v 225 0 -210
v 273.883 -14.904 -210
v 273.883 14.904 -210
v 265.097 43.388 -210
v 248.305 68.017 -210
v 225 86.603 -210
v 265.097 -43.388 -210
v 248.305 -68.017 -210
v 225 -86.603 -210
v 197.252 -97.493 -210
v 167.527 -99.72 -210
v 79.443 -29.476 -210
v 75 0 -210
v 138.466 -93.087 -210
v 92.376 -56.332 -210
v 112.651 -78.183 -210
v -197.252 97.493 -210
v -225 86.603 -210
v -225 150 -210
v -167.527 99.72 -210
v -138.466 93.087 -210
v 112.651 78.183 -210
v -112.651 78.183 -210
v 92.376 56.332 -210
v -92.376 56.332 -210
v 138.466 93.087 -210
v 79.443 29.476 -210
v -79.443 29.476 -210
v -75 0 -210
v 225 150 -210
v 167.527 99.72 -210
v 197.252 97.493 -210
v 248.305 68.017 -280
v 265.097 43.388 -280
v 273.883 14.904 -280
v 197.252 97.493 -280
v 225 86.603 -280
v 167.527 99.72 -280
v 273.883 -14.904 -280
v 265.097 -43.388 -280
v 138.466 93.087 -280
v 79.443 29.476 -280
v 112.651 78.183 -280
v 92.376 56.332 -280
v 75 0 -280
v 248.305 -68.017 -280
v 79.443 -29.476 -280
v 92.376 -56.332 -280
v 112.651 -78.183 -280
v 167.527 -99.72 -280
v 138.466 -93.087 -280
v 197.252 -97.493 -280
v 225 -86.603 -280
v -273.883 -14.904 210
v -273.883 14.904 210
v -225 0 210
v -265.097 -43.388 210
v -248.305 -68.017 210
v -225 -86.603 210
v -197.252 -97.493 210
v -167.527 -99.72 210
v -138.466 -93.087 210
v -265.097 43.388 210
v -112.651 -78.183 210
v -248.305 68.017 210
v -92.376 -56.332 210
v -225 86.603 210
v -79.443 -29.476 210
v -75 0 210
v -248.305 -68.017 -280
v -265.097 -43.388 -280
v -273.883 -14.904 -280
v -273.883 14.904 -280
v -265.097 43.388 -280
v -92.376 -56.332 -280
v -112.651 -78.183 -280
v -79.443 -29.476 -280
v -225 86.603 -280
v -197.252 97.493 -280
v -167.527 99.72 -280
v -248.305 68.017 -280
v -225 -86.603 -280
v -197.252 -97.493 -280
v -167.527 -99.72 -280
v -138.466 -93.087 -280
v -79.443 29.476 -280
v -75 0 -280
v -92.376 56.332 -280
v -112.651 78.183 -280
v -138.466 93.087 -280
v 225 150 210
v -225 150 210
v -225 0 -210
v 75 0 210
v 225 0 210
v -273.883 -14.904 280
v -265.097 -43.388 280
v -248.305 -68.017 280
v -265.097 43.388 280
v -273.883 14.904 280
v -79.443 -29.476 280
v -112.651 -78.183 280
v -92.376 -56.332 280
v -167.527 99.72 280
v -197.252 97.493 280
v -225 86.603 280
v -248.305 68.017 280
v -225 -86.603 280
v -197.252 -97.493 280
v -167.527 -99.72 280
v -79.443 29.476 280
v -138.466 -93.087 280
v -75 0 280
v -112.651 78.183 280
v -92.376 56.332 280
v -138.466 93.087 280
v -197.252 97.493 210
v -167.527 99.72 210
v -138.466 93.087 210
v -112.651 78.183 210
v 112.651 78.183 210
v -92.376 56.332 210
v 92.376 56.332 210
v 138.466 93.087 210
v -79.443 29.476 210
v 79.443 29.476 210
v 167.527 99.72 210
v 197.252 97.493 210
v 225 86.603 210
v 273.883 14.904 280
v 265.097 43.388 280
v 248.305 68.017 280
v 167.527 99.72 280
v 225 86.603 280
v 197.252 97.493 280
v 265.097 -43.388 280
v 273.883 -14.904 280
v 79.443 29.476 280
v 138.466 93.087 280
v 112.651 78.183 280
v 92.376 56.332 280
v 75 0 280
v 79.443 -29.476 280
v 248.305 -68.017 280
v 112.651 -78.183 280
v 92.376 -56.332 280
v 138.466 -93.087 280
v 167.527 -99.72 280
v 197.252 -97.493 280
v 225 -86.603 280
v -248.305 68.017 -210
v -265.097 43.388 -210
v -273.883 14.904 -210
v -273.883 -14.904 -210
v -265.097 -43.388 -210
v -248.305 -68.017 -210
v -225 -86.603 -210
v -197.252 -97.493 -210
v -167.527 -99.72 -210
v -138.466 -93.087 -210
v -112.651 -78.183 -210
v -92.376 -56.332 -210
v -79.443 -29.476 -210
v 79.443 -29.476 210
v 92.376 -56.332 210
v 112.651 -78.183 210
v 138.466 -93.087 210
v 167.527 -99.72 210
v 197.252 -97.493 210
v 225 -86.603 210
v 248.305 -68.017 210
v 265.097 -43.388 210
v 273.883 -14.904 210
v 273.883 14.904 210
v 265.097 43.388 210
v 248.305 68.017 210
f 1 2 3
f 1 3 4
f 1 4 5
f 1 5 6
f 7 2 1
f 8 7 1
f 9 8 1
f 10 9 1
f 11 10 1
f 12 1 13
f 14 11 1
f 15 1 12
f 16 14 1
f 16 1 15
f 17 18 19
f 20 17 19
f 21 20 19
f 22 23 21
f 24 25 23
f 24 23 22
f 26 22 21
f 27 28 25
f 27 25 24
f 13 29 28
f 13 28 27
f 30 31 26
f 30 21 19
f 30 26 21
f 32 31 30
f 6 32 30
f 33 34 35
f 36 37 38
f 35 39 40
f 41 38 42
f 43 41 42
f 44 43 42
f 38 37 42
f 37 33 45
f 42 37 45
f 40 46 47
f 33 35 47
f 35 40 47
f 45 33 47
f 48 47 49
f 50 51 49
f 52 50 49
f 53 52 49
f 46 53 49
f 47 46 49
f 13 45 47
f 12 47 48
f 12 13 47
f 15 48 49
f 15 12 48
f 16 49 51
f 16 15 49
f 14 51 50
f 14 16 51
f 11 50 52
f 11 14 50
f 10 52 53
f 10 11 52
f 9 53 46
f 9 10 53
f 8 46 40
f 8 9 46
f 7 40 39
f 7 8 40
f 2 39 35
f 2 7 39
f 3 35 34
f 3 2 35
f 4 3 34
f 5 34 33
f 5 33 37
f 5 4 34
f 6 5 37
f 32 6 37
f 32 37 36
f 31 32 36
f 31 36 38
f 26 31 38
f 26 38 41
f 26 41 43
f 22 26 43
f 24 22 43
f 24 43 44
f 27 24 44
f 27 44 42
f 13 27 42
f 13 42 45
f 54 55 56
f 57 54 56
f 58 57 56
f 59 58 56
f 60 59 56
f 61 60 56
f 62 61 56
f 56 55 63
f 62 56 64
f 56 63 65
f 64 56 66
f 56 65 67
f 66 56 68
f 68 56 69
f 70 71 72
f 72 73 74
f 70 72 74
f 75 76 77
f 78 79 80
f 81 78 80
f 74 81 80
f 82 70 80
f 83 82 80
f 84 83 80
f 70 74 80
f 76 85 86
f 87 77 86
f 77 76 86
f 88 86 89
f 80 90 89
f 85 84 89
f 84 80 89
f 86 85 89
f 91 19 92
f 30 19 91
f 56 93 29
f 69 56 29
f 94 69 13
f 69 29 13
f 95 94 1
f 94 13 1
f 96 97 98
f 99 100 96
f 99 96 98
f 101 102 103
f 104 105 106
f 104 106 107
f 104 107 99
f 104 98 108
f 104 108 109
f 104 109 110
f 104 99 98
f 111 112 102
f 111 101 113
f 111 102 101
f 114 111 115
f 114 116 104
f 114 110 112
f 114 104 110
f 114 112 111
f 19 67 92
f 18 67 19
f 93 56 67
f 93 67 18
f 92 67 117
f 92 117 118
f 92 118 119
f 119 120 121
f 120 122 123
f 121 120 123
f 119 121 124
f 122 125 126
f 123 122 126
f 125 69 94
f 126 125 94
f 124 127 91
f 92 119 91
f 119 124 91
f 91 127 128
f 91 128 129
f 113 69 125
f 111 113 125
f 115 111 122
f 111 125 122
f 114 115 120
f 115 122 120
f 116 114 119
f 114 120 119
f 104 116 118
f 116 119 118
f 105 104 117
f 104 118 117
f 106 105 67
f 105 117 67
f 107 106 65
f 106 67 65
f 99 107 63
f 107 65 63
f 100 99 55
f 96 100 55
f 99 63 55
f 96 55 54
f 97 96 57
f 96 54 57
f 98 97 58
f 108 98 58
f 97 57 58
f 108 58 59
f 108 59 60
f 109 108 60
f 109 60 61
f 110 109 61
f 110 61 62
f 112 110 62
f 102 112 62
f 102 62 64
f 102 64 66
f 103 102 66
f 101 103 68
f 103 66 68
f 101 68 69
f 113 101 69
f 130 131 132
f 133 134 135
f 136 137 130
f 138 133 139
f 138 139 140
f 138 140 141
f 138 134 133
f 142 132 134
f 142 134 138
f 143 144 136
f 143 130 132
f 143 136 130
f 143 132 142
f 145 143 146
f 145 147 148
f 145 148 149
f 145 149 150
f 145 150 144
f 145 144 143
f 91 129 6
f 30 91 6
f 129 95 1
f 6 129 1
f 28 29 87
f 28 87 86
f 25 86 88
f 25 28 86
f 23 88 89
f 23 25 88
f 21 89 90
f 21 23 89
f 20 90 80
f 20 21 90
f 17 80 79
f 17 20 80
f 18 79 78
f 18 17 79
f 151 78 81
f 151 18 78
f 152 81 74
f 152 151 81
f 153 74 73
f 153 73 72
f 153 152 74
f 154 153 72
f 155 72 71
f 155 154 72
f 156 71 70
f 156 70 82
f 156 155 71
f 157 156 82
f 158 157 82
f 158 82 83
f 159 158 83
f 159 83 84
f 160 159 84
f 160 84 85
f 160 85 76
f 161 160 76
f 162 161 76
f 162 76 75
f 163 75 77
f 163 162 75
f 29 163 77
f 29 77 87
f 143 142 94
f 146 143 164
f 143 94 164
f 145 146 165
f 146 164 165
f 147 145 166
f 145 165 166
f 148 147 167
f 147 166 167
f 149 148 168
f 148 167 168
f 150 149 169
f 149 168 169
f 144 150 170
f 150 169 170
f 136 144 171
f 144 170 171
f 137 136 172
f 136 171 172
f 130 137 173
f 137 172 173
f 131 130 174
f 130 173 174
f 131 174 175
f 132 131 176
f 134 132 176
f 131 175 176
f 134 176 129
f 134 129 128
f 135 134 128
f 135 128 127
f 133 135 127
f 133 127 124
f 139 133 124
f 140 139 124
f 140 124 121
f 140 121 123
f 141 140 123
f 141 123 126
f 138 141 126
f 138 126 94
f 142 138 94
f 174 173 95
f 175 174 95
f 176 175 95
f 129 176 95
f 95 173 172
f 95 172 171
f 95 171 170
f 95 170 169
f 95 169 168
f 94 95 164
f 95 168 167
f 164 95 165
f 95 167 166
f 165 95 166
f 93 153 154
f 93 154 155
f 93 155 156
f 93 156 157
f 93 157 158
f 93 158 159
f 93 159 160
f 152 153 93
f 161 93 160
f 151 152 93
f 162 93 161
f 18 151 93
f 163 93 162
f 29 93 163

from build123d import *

# Parameters (mm, degrees)
SKETCH2_W           = 450
SKETCH2_H           = 420
BOSS_EXTRUDE1_DEPTH = 150
SKETCH3_R           = 100
BOSS_EXTRUDE2_DEPTH = 70


with BuildPart() as part:
    # Sketch2 → Boss-Extrude1 (new body)
    with BuildSketch(Plane(origin=(0, 0, 0), x_dir=(1, 0, 0), z_dir=(0, 1, 0))):
        Rectangle(SKETCH2_W, SKETCH2_H)
    extrude(amount=BOSS_EXTRUDE1_DEPTH)

    # Sketch3 → Boss-Extrude2 (add)
    with BuildSketch(Plane.XY.offset(210)):
        with Locations((-175, 0)):
            Circle(SKETCH3_R)
        with Locations(Location((175, 0, 0), (0, 0, 180))):
            Circle(SKETCH3_R)
    boss_extrude2 = extrude(amount=BOSS_EXTRUDE2_DEPTH)

    # Mirror1: Boss-Extrude2 across plane
    add(boss_extrude2.mirror(Plane.XY))


solid = part.part
